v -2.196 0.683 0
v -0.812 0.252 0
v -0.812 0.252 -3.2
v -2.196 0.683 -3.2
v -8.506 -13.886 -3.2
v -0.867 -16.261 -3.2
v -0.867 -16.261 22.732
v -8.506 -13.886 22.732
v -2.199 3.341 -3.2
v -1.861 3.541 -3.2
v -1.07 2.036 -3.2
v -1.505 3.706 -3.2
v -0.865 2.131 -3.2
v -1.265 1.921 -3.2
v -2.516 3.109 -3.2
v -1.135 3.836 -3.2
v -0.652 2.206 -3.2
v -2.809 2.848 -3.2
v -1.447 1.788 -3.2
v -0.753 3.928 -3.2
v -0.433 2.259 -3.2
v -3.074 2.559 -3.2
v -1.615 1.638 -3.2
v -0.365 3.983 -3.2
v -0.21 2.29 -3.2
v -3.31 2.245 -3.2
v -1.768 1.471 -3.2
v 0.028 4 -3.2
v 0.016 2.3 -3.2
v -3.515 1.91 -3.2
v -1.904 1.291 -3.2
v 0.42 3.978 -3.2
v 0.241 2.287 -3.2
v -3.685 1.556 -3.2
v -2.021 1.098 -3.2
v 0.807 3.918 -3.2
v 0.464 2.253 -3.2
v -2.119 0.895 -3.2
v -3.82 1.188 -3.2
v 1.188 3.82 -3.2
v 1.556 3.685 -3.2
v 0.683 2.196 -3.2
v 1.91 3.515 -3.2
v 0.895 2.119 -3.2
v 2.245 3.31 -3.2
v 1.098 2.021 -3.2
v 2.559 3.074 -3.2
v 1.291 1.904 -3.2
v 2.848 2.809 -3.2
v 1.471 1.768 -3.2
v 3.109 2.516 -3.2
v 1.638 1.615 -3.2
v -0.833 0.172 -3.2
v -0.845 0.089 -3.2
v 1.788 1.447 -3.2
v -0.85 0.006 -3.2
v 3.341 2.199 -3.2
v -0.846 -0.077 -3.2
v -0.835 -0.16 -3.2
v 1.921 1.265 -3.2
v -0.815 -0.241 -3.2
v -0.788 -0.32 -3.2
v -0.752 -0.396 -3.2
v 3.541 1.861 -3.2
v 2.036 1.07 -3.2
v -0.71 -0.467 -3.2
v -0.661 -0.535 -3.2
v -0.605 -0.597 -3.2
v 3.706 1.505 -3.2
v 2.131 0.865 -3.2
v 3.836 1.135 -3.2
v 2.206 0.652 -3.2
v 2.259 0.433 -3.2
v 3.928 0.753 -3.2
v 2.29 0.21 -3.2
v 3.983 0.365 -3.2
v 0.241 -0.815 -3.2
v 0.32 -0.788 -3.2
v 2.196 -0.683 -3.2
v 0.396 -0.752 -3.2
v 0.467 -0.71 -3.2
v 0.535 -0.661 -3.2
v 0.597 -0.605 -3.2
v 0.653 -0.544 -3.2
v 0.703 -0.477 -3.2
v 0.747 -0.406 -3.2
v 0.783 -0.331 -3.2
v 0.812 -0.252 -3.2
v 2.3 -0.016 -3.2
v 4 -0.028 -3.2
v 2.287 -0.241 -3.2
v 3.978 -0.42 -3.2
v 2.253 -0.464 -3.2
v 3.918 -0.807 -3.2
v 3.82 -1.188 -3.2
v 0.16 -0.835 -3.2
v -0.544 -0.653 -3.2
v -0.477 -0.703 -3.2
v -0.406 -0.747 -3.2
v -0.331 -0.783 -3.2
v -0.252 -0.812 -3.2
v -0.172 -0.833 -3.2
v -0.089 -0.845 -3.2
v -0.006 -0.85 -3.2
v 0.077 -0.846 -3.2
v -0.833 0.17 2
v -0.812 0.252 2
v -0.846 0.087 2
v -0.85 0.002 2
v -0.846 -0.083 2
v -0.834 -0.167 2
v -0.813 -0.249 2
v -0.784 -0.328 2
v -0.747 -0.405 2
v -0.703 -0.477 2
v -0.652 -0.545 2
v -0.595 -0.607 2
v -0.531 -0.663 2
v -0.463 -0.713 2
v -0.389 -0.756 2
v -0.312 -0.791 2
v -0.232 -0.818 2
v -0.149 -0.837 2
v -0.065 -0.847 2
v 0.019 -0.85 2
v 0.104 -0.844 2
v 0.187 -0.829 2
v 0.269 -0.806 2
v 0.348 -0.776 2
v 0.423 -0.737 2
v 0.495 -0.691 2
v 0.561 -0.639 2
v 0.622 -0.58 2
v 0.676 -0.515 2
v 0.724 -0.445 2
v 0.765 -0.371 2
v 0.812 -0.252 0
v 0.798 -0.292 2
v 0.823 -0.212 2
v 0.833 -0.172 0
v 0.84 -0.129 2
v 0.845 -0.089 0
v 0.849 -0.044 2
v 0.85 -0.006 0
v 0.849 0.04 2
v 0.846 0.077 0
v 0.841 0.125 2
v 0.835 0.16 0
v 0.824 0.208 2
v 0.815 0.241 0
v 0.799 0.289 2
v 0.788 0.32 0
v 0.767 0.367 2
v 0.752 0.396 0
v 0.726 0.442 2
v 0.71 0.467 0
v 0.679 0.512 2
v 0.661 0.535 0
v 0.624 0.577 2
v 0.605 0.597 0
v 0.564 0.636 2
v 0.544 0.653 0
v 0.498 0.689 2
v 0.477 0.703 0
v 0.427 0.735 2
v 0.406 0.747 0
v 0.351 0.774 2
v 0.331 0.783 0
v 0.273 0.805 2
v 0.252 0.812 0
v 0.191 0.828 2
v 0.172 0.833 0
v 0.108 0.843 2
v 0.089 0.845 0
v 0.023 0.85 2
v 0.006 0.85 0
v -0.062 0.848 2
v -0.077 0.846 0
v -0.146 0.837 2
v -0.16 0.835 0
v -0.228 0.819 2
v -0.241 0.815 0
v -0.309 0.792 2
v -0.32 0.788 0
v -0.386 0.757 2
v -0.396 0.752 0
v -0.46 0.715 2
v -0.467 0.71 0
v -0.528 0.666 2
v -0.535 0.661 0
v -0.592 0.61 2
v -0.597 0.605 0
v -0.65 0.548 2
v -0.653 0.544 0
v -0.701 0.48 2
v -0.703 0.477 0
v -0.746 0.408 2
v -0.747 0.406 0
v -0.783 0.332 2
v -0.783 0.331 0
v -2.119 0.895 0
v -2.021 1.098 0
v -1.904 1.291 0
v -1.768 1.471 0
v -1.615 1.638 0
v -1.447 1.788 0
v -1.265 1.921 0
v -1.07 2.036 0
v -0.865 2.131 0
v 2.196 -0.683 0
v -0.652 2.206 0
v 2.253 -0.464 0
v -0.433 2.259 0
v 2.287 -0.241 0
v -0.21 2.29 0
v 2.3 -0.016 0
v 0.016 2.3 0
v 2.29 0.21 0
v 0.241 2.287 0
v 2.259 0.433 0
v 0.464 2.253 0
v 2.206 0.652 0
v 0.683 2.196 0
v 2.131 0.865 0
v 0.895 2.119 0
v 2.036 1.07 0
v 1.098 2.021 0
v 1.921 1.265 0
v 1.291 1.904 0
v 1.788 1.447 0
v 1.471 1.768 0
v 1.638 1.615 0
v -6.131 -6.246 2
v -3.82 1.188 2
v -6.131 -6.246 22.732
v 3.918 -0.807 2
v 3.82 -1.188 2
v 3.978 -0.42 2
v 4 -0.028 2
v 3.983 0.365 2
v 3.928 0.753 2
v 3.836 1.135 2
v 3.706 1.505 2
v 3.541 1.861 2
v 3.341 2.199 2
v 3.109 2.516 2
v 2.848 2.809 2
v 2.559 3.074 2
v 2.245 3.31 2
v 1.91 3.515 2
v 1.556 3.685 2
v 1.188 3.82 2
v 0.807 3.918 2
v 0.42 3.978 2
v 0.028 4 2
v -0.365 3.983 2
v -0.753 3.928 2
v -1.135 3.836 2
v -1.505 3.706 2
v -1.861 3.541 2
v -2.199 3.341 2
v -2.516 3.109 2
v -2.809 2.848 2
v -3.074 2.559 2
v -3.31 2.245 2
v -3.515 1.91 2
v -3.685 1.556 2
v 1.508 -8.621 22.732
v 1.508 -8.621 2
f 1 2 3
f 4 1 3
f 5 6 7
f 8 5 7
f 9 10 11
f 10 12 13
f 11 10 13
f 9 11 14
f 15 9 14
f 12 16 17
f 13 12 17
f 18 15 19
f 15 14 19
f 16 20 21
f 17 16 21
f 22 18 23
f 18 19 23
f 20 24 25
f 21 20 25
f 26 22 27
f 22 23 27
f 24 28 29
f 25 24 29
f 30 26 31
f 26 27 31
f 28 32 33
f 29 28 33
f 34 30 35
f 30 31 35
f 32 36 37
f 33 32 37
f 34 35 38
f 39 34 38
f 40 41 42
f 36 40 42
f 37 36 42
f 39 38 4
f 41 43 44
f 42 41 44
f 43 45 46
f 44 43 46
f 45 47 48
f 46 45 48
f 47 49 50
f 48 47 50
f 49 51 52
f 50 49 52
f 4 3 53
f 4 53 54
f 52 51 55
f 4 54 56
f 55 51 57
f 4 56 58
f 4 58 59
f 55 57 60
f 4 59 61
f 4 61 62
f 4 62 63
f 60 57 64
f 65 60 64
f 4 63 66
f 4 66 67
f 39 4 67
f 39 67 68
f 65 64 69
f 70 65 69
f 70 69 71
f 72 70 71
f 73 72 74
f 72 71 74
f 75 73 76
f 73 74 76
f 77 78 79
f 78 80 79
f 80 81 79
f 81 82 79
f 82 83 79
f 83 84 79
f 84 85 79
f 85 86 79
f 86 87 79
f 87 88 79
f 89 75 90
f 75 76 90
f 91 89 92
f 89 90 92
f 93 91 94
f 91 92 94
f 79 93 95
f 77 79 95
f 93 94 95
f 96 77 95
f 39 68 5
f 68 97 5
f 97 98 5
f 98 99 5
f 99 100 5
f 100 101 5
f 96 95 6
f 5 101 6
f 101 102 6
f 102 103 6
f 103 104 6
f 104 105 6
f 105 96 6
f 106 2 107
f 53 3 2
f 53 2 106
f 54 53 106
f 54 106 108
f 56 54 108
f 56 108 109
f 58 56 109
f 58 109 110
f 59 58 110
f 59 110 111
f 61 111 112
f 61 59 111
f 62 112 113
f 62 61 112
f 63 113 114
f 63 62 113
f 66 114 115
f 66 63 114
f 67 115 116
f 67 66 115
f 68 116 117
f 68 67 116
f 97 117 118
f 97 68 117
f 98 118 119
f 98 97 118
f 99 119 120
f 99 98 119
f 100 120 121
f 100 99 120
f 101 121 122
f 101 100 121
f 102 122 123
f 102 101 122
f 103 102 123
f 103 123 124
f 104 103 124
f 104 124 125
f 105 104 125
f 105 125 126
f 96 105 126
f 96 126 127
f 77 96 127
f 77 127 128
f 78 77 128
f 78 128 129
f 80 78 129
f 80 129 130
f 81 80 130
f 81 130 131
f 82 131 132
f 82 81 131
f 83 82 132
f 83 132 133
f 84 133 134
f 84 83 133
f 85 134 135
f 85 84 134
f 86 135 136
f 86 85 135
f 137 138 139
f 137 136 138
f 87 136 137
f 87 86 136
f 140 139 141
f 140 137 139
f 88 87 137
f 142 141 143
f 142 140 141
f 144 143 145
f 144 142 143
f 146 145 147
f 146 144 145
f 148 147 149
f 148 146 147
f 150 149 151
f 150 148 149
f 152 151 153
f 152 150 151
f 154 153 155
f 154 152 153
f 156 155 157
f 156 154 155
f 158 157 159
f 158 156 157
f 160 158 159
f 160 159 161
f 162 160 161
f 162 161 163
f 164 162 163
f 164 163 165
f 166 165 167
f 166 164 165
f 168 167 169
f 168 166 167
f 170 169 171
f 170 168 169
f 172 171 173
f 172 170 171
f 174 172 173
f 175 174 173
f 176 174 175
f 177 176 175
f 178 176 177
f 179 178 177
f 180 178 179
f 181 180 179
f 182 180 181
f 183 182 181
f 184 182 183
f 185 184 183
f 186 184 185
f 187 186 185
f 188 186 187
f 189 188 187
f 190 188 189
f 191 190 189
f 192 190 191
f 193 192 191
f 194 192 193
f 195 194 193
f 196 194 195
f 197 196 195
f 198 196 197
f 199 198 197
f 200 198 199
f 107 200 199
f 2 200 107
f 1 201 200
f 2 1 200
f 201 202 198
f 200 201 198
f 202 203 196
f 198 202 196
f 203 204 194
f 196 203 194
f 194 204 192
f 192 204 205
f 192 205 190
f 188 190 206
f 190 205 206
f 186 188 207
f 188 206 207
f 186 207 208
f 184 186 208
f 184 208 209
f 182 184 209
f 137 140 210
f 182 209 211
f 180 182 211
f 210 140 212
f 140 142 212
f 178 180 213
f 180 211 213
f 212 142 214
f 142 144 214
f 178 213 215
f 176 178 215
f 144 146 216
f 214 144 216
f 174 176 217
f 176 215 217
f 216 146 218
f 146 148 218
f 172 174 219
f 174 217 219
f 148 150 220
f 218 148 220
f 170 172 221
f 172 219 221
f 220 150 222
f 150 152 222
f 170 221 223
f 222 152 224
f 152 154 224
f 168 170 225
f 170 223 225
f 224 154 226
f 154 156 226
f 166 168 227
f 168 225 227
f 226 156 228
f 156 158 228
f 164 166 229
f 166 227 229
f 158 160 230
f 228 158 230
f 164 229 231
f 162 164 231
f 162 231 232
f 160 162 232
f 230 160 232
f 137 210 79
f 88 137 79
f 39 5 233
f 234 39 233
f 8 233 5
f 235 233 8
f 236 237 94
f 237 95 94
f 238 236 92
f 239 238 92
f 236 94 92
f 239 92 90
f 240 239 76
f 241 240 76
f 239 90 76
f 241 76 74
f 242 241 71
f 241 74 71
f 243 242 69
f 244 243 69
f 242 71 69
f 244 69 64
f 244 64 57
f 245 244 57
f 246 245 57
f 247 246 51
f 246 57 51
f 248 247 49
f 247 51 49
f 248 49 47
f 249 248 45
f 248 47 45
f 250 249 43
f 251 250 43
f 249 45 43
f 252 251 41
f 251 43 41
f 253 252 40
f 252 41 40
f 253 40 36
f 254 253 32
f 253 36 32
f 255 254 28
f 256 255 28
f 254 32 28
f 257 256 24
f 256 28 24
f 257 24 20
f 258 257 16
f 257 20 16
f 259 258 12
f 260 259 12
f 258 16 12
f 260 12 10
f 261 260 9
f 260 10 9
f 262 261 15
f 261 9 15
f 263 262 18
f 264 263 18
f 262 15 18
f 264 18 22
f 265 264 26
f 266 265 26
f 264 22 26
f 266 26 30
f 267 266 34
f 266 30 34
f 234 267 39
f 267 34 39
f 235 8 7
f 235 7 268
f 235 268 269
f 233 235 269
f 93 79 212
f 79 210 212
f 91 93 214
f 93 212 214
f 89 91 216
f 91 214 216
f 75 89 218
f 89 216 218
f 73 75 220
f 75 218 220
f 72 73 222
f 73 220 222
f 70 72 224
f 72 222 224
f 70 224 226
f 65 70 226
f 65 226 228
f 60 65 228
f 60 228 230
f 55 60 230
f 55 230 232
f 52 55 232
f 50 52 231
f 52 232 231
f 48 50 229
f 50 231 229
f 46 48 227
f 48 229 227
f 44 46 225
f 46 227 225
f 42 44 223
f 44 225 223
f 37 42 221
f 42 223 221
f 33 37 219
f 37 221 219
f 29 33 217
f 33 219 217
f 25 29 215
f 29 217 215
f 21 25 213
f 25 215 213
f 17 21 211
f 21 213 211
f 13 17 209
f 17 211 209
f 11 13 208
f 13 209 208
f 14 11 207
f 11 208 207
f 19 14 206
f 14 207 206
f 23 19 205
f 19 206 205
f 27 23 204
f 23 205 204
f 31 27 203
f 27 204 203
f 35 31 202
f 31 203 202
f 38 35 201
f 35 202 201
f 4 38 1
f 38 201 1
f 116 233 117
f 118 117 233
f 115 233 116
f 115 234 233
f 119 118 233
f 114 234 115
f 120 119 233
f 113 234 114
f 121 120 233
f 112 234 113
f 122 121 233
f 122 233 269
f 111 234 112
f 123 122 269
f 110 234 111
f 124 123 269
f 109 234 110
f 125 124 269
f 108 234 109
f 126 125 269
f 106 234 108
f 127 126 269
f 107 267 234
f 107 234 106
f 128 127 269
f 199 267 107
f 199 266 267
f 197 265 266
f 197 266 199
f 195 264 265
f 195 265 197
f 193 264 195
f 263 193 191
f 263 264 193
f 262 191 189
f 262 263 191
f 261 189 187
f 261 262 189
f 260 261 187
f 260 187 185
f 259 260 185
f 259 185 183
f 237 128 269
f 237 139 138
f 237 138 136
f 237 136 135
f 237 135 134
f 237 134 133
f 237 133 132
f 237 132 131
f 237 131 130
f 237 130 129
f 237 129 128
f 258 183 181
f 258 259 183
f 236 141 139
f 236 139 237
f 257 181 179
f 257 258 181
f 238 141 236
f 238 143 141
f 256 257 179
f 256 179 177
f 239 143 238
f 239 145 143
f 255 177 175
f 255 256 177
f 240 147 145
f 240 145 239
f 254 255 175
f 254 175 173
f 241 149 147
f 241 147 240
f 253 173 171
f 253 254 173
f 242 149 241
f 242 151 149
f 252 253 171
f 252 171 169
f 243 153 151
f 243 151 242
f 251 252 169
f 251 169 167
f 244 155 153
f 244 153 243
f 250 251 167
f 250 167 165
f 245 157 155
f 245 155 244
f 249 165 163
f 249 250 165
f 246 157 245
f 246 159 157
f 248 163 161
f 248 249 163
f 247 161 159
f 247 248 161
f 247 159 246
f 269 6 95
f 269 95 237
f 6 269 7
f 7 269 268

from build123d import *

# Parameters (mm, degrees)
SKETCH1_R           = 4
SKETCH1_R_2         = 2.3
BOSS_EXTRUDE1_DEPTH = 3.2
SKETCH2_R           = 4
SKETCH2_R_2         = 0.85
BOSS_EXTRUDE2_DEPTH = 2
BOSS_EXTRUDE3_DEPTH = 8
SKETCH6_R           = 0.85
CUT_EXTRUDE1_DEPTH  = 6.2


with BuildPart() as part:
    # Sketch1 → Boss-Extrude1 (new body)
    with BuildSketch(Plane.XY):
        Circle(SKETCH1_R)
        Circle(SKETCH1_R_2, mode=Mode.SUBTRACT)
    extrude(amount=-BOSS_EXTRUDE1_DEPTH)

    # Sketch2 → Boss-Extrude2 (add)
    with BuildSketch(Plane.XY):
        Circle(SKETCH2_R)
        Circle(SKETCH2_R_2, mode=Mode.SUBTRACT)
    extrude(amount=BOSS_EXTRUDE2_DEPTH)

    # Sketch5 → Boss-Extrude3 (add)
    with BuildSketch(Plane(origin=(3.819651946, -1.187543266, 0), x_dir=(0, 0, -1), z_dir=(0.954912987, -0.296885816, 0))):
        Polygon((-2, 0), (3.2, 0), (3.2, -15.784917441), (-22.731913212, -15.784917441), (-22.731913212, -7.784917441), (-2, -7.784917441), align=None)
    extrude(amount=-BOSS_EXTRUDE3_DEPTH)

    # Sketch6 → Cut-Extrude1 (cut, through all)
    with BuildSketch(Plane.XY.offset(2)):
        Circle(SKETCH6_R)
    extrude(amount=-CUT_EXTRUDE1_DEPTH, mode=Mode.SUBTRACT)


solid = part.part
